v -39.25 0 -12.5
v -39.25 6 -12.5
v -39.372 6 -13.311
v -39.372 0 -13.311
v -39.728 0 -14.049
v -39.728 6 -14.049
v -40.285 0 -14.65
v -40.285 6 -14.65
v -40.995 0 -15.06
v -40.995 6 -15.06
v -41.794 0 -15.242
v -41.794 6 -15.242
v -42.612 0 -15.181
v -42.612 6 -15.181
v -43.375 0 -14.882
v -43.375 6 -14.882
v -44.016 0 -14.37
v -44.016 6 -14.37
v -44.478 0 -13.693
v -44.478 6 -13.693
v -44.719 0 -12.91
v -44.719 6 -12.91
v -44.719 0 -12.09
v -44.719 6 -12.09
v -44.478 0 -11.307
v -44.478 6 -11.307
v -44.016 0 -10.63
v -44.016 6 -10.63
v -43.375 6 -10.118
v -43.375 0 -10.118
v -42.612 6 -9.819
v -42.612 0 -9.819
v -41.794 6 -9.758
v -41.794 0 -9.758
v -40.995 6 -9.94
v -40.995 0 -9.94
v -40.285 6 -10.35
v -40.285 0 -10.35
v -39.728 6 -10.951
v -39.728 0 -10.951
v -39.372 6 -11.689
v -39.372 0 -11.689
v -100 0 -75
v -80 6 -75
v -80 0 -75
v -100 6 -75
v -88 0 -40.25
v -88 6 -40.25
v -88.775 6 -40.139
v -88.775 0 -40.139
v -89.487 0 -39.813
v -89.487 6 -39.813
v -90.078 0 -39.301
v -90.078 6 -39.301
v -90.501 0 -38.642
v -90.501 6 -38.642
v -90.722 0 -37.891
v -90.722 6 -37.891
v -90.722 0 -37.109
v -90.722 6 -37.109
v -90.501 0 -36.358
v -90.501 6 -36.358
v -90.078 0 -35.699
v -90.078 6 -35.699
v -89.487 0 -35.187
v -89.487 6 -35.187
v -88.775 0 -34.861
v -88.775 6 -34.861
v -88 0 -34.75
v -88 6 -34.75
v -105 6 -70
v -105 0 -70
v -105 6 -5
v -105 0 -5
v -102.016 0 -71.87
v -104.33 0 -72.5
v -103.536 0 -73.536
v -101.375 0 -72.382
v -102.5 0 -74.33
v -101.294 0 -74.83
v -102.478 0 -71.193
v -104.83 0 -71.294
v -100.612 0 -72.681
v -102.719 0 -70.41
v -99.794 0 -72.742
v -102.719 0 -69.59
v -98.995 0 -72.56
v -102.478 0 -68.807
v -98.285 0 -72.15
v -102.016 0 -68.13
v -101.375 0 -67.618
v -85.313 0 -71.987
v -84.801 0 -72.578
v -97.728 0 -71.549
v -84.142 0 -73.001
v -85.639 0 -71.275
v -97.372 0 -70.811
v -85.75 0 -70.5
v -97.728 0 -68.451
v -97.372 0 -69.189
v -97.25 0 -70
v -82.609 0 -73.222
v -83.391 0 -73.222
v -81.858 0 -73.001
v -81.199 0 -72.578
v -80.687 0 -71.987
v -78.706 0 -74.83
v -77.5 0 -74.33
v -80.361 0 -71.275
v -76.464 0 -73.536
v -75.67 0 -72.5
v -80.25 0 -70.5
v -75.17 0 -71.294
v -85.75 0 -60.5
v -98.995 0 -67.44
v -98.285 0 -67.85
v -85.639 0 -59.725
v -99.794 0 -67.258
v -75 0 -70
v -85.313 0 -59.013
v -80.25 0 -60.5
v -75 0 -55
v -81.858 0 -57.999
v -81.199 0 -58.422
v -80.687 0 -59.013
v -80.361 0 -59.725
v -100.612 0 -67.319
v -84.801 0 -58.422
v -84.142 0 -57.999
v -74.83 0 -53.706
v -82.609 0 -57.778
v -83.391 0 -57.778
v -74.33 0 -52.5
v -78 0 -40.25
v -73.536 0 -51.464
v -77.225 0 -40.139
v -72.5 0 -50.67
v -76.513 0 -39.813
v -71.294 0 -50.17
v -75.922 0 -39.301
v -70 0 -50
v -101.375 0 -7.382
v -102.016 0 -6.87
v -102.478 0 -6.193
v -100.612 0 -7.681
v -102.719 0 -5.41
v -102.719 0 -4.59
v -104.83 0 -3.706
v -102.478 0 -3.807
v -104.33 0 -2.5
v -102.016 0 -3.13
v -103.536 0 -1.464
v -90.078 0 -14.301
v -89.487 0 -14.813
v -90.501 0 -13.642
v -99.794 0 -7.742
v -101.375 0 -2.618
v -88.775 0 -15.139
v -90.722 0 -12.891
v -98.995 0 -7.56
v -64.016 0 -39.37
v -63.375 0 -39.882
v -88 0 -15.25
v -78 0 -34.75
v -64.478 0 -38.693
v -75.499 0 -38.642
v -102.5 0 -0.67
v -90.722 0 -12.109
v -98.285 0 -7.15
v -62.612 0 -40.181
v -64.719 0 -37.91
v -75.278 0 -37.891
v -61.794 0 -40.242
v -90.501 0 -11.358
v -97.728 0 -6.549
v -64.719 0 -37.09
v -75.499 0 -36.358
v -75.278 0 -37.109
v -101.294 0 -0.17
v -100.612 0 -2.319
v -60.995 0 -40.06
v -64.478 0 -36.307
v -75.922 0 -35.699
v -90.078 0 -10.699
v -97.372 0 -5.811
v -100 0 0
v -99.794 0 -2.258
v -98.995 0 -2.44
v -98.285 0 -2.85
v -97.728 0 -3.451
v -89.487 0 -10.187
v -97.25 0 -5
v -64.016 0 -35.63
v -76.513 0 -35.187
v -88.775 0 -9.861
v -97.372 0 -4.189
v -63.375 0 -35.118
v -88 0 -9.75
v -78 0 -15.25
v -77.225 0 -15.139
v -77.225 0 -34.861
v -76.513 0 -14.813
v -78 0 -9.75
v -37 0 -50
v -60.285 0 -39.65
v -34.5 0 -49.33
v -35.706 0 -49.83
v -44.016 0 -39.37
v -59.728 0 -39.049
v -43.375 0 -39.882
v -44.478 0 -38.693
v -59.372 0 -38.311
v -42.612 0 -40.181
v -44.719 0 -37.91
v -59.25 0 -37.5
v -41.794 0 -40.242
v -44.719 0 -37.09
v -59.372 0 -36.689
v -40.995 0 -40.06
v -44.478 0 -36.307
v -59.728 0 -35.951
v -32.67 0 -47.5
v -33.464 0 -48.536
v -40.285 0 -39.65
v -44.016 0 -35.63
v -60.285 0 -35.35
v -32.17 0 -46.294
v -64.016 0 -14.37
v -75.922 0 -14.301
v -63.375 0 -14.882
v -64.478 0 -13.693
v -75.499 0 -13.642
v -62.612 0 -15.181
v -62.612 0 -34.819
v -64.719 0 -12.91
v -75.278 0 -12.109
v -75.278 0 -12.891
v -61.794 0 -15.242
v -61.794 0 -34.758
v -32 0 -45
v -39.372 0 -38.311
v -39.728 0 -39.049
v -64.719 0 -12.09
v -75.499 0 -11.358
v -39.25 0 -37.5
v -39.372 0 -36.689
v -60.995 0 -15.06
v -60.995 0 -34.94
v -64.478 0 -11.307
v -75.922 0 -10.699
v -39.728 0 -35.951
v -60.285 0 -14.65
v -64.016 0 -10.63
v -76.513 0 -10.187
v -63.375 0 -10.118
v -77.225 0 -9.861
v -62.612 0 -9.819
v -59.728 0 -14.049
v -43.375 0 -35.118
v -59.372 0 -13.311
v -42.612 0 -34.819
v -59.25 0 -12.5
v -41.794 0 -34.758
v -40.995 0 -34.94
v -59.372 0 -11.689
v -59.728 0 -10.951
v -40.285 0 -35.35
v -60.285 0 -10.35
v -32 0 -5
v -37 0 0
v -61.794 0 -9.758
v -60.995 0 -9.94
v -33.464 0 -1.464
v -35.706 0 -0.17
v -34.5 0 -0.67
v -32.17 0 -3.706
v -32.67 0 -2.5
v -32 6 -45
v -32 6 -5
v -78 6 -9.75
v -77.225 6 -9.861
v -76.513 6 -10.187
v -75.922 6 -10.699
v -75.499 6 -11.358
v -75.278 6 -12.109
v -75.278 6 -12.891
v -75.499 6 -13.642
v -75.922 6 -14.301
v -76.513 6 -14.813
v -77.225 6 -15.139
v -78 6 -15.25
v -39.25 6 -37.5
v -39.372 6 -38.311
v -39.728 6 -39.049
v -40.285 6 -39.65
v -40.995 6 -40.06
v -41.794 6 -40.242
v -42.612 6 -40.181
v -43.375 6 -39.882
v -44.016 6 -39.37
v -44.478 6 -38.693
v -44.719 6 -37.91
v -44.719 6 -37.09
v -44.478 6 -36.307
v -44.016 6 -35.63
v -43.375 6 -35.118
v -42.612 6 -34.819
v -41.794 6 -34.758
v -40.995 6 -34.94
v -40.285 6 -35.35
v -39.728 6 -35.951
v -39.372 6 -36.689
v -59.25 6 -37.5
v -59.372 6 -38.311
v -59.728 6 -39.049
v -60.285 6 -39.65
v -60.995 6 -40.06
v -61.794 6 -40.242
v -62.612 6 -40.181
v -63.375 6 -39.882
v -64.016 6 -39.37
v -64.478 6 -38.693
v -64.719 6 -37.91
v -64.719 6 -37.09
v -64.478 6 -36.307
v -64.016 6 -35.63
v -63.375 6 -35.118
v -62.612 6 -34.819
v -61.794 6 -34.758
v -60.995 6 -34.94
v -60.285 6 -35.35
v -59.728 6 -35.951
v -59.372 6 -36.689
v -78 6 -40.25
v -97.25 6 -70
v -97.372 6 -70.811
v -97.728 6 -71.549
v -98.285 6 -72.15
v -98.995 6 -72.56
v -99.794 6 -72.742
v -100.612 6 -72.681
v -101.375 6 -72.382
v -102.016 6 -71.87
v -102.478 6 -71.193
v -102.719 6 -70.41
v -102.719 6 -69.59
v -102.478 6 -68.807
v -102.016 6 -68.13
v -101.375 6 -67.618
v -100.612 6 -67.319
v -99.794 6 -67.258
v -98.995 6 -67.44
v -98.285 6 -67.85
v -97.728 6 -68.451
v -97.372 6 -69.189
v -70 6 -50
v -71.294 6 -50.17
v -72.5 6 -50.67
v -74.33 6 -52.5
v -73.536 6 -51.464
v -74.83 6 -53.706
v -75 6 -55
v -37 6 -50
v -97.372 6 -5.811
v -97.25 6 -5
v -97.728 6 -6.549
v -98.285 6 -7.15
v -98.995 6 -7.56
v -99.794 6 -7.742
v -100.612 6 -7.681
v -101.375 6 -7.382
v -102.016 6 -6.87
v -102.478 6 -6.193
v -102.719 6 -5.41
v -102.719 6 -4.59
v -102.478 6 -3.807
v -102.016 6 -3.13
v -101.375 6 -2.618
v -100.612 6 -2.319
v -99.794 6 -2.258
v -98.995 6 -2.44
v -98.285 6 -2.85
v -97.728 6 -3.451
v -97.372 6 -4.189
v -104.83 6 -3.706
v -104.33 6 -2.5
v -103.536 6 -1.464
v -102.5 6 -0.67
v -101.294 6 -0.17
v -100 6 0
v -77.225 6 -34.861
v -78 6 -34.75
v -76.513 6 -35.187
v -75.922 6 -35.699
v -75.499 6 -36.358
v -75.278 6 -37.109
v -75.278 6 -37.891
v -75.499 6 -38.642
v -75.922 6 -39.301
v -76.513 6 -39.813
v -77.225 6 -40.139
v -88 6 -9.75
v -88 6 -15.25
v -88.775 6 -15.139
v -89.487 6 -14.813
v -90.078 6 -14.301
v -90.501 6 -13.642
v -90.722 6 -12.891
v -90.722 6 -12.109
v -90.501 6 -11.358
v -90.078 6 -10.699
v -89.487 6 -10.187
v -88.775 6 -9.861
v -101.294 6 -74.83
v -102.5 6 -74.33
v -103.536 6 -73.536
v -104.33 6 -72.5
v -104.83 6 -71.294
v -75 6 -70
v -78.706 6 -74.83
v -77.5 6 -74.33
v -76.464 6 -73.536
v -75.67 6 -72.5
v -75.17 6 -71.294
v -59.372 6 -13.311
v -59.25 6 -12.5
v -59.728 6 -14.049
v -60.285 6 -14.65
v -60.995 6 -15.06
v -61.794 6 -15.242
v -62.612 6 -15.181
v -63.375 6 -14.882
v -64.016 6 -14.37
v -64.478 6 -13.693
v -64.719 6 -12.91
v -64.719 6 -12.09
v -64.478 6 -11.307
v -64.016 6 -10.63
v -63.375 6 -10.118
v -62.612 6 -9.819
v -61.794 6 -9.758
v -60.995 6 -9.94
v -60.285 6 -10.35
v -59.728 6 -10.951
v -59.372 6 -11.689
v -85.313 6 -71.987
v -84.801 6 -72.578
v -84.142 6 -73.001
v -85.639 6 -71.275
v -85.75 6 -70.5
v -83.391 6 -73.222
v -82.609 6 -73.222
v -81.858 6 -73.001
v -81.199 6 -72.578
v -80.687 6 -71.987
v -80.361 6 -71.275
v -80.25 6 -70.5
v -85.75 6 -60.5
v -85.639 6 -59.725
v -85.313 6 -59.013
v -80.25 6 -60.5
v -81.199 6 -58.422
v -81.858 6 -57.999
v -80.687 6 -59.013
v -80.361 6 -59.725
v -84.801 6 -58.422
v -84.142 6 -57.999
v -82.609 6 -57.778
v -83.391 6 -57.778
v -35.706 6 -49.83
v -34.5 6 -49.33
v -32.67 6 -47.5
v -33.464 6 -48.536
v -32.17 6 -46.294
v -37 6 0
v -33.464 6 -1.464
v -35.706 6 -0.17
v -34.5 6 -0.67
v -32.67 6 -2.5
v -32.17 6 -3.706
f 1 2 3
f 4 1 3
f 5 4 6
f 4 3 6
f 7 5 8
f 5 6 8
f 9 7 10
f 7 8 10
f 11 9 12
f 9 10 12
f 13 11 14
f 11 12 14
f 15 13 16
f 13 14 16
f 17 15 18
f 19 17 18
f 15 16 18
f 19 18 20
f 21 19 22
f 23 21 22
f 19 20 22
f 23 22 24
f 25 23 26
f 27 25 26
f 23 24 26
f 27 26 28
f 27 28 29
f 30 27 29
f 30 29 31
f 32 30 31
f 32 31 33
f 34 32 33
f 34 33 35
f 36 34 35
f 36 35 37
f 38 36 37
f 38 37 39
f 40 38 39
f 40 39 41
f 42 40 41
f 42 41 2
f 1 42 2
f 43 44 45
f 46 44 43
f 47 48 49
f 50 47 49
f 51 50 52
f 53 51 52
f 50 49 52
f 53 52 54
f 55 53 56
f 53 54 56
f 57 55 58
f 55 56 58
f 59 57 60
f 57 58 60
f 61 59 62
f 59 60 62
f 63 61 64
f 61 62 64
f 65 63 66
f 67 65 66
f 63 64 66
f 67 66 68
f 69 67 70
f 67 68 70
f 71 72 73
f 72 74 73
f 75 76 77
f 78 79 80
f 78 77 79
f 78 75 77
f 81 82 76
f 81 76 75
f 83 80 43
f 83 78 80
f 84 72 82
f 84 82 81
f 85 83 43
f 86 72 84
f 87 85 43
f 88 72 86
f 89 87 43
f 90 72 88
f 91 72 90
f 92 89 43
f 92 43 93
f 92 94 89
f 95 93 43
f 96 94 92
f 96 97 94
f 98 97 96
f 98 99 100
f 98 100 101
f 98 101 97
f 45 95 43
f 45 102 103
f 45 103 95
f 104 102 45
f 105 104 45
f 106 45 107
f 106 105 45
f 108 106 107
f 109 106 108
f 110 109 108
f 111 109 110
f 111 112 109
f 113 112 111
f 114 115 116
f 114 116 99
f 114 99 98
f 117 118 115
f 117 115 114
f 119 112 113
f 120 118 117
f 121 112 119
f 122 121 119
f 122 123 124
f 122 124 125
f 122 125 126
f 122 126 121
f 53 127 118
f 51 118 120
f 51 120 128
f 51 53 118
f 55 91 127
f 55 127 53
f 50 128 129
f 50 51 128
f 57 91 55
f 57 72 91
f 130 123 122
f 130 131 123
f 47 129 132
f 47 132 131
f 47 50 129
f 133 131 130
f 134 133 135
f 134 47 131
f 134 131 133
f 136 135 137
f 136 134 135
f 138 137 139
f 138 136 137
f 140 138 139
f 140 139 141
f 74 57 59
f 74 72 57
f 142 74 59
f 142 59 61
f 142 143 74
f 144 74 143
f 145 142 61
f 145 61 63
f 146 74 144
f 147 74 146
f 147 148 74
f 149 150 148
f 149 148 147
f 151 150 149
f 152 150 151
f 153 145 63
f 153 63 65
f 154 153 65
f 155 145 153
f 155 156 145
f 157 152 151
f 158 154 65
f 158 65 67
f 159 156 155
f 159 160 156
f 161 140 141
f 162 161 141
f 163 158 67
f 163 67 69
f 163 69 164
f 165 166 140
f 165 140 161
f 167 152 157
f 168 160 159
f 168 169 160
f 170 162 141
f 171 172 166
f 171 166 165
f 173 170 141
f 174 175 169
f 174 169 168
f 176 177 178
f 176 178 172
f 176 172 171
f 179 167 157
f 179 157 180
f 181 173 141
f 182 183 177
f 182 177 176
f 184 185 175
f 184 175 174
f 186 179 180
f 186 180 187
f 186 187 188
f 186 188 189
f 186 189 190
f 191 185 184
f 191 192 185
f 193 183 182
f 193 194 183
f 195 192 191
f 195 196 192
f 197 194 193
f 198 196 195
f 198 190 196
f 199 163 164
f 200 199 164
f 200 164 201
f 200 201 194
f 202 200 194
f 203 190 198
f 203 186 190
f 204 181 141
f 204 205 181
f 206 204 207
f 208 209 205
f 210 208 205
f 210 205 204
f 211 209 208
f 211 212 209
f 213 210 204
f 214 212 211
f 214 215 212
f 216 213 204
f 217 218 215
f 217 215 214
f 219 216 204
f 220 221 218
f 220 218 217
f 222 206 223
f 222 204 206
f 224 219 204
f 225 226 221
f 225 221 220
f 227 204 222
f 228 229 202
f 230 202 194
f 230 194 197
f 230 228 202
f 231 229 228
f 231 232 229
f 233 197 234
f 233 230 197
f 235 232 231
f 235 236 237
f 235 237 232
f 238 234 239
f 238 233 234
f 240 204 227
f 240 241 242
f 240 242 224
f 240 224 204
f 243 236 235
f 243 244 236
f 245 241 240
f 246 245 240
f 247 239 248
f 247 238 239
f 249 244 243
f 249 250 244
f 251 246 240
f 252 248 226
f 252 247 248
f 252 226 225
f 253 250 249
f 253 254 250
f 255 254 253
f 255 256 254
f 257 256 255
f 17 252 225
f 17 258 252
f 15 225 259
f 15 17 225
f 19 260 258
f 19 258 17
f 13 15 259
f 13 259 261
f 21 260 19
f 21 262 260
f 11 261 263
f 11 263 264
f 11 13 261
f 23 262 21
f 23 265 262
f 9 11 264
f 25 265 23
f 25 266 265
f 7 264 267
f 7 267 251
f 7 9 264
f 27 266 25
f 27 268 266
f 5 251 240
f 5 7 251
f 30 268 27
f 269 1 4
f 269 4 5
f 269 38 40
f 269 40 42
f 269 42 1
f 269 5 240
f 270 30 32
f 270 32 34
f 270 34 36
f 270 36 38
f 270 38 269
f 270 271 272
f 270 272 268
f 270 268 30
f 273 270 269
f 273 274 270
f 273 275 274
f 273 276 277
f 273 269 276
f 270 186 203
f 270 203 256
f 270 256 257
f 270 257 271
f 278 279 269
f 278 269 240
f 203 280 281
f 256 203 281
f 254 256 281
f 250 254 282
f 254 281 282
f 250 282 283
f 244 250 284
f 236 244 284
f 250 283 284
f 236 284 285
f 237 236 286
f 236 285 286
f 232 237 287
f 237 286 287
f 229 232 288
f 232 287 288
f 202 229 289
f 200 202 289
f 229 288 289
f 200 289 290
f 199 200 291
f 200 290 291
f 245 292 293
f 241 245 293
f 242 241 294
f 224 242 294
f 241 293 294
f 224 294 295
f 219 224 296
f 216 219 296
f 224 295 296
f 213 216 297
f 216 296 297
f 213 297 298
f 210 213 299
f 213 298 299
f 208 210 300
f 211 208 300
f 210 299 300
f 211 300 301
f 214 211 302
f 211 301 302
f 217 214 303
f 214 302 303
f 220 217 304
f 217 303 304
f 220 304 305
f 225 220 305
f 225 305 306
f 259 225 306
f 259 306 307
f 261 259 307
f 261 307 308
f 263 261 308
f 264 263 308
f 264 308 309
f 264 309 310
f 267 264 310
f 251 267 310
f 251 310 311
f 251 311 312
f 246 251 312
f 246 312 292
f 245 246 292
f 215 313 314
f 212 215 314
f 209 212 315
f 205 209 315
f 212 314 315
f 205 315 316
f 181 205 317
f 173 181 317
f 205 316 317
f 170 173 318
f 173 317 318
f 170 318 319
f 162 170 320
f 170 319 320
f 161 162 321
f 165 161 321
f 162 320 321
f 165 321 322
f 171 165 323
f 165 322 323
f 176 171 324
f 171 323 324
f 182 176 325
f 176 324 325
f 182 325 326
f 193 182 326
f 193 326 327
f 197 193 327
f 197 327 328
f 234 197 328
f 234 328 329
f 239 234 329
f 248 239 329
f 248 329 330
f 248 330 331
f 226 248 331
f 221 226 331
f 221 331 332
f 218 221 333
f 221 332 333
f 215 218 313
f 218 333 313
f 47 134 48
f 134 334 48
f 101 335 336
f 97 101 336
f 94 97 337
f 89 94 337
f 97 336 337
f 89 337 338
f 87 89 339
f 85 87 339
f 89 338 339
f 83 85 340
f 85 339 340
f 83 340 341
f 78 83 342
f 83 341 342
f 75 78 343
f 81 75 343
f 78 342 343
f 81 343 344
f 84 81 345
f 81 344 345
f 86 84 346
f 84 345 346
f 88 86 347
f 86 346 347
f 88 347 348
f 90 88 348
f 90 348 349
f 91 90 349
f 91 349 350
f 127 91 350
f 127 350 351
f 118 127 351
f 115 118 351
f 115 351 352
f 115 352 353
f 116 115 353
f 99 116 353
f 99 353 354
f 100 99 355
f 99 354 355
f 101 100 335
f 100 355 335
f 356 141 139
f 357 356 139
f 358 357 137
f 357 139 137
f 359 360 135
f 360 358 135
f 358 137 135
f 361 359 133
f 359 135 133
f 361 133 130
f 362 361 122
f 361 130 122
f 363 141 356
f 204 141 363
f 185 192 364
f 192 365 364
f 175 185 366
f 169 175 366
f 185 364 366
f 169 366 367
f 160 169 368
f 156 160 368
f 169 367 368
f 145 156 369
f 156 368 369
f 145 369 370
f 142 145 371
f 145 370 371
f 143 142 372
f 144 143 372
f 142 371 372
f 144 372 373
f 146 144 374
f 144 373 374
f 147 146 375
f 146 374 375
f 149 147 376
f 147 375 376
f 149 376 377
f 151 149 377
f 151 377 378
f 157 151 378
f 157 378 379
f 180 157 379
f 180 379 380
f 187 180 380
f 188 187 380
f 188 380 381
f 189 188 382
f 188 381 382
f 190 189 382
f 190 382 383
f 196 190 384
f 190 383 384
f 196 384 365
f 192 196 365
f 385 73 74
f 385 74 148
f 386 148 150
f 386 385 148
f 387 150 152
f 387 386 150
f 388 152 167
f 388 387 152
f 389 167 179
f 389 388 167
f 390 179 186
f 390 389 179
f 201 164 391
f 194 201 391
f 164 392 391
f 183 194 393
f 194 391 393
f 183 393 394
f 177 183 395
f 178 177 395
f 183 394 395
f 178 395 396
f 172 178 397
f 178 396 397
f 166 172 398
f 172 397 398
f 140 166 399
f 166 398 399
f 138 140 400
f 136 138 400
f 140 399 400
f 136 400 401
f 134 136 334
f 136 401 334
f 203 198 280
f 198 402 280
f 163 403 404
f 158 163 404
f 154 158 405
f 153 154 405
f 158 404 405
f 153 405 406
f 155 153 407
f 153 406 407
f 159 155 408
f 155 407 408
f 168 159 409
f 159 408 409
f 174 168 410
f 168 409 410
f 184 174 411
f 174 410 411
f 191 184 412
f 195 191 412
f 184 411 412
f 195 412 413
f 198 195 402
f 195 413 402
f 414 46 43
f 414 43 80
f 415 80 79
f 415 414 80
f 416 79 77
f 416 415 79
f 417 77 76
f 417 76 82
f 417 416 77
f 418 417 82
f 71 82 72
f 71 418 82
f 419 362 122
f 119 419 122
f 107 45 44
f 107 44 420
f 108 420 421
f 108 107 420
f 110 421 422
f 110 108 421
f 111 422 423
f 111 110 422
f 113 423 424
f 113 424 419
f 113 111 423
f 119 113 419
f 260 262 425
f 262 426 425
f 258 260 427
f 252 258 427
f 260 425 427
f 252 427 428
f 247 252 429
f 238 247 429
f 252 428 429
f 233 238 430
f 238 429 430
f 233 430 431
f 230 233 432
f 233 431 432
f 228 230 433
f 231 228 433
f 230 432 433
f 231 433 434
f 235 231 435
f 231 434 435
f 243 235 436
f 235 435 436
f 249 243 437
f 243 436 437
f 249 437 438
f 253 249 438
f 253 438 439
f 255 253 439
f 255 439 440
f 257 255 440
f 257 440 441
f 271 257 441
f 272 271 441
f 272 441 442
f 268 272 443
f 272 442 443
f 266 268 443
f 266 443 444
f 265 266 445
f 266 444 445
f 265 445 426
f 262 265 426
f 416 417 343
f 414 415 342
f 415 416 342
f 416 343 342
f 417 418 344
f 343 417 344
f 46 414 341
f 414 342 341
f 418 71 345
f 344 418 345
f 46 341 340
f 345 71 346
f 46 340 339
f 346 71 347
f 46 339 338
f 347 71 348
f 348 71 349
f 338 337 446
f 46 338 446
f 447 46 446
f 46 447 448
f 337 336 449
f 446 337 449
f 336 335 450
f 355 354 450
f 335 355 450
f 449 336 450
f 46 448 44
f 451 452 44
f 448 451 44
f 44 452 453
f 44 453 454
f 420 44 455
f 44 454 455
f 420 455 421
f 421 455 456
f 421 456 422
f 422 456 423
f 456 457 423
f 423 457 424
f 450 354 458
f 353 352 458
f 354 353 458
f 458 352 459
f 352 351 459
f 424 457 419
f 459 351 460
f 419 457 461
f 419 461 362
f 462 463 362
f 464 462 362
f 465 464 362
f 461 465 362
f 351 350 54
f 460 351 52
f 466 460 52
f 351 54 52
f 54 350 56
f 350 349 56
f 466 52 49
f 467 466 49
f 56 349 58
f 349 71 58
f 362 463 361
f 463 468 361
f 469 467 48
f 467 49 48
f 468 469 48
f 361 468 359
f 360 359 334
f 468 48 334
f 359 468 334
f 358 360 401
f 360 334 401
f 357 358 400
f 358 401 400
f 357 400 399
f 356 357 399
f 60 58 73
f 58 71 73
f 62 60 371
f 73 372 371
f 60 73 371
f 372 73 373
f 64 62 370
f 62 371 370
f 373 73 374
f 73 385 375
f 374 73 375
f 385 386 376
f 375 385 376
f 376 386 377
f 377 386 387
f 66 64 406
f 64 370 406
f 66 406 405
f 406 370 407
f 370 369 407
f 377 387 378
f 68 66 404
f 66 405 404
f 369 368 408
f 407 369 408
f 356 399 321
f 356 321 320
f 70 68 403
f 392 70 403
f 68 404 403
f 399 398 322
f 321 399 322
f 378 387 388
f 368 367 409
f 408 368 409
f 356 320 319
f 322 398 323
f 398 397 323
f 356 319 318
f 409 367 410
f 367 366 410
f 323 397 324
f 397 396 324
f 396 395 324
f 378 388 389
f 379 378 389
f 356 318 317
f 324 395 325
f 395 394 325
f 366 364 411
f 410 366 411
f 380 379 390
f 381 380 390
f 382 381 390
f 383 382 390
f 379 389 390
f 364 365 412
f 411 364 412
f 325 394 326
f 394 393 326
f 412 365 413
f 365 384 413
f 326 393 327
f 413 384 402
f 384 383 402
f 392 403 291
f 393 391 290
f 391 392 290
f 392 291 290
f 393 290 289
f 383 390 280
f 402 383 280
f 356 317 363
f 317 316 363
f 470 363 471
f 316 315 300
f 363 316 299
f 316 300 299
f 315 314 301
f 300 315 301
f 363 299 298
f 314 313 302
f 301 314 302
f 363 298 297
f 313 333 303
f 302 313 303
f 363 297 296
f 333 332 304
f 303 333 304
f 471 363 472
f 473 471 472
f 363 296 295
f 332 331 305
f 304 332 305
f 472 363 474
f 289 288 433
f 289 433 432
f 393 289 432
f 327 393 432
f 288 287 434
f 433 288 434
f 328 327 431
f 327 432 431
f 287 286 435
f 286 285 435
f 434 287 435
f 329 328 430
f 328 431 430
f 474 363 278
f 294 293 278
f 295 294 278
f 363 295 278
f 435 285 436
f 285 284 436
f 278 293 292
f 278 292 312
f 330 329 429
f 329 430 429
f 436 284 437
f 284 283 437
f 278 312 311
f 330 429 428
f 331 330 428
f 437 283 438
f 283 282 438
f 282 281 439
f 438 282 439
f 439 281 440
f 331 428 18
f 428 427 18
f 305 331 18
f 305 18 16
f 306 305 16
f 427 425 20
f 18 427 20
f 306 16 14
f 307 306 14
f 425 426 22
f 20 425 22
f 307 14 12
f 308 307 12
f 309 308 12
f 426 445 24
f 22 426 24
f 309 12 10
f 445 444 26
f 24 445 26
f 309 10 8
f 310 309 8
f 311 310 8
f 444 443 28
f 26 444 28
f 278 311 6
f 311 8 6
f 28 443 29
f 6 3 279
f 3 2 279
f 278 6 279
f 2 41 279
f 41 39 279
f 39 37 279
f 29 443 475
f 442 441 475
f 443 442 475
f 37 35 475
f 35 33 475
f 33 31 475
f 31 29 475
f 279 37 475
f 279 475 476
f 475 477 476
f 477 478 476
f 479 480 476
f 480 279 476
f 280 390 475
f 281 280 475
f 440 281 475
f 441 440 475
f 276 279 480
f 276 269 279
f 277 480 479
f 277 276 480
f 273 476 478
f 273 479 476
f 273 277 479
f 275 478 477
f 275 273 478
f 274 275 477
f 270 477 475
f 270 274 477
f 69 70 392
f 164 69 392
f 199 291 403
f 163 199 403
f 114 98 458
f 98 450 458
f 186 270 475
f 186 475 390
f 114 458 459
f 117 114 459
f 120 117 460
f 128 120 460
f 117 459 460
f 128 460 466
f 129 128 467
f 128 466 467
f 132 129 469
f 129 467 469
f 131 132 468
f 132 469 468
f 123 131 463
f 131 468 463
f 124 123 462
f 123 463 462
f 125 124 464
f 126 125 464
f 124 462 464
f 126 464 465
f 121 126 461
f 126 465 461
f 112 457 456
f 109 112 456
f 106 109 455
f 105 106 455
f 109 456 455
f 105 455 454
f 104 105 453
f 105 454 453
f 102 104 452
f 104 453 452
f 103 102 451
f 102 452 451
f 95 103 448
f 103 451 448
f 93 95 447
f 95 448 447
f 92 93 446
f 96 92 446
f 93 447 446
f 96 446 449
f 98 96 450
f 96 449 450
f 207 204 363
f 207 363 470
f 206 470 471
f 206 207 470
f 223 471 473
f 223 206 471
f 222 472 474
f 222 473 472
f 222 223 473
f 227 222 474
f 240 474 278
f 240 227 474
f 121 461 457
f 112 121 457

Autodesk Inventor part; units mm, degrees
ref_plane "YZ Plane" through (0, 0, 0) normal (1, 0, 0) x (0, 1, 0)
ref_plane "XZ Plane" through (0, 0, 0) normal (0, 1, 0) x (-1, 0, 0)
ref_plane "XY Plane" through (0, 0, 0) normal (0, 0, 1) x (1, 0, 0)
sketch "Sketch1" plane through (0, 0, 0) normal (0, 1, 0) x (-1, 0, 0)
  line L0 (0, 0) -> (105, 0)
  line L1 (105, 0) -> (105, -50)
  line L2 (105, -50) -> (0, -50)
  line L3 (0, -50) -> (0, 0)
  line L4 (0, 0) -> (0, -16.6667)
  line L5 (0, -16.6667) -> (11, -16.6667)
  dimension "d0" = 105
  dimension "d1" = 50
  dimension "d2" = 16.6667
  dimension "d3" = 11
extrude "Extrusion1" add sketch "Sketch1" along normal blind 6
sketch "Sketch3" plane through (0, 6, 0) normal (0, 1, 0) x (1, 0, 0)
  circle A0 centre (-20, 12.5) radius 2.75
  line L0 (0, 0) -> (0, 50) projected
  line L1 (-105, 0) -> (0, 0) projected
  circle A1 centre (-20, 37.5) radius 2.75
  dimension "d21" = 5.5
  dimension "d22" = 20
  dimension "d23" = 12.5
  dimension "d26" = 25
extrude "Extrusion3" cut sketch "Sketch3" against normal through all
sketch "Sketch4" plane through (0, 6, 0) normal (0, 1, 0) x (1, 0, 0)
  circle A0 centre (-20, 12.5) radius 2.75 projected
  line L0 (-20, 12.5) -> (-78, 12.5)
  line L1 (-78, 12.5) -> (-88, 12.5) construction
  line L2 (-78, 15.25) -> (-88, 15.25)
  line L3 (-88, 9.75) -> (-78, 9.75)
  arc A1 (-78, 9.75) -> (-78, 15.25) centre (-78, 12.5) ccw
  arc A2 (-88, 15.25) -> (-88, 9.75) centre (-88, 12.5) ccw
  point P0 (0, 0)
  point P1 (-83, 12.5)
  dimension "d33" = 58
  dimension "d34" = 10
  dimension "d35" = 5.5
extrude "Extrusion4" cut sketch "Sketch4" against normal through all contours A1 L3 A2 L2
pattern_linear "Rectangular Pattern2" count 2 spacing 25 along (0, 0, -1) of "Extrusion4"
sketch "Sketch5" plane through (0, 0, -50) normal (0, 0, -1) x (-1, 0, 0)
  line L0 (105, 0) -> (105, 6) projected
  line L1 (105, 0) -> (0, 0) projected
  line L2 (105, 6) -> (75, 6)
  line L3 (75, 6) -> (75, 0)
  line L4 (75, 0) -> (105, 0)
  line L5 (105, 0) -> (105, 6)
  dimension "d45" = 30
extrude "Extrusion5" add sketch "Sketch5" along normal blind 25
sketch "Sketch6" plane through (0, 6, 0) normal (0, 1, 0) x (1, 0, 0)
  line L0 (-83, 60.5) -> (-83, 70.5) construction
  line L1 (-80.25, 60.5) -> (-80.25, 70.5)
  line L2 (-85.75, 70.5) -> (-85.75, 60.5)
  arc A0 (-85.75, 60.5) -> (-80.25, 60.5) centre (-83, 60.5) ccw
  arc A1 (-80.25, 70.5) -> (-85.75, 70.5) centre (-83, 70.5) ccw
  line L3 (-75, 50) -> (-75, 75) projected
  arc A2 (-88, 40.25) -> (-88, 34.75) centre (-88, 37.5) ccw projected
  point P0 (0, 0)
  point P1 (-83, 65.5)
  dimension "d48" = 10
  dimension "d49" = 5.5
  dimension "d50" = 8
  dimension "d51" = 28
extrude "Extrusion6" cut sketch "Sketch6" against normal through all
fillet "Fillet2" radius 5 6 edges at (-105, 3, 0) (0, 3, 0) (-75, 3, -75) (-105, 3, -75) (0, 3, -50) (-75, 3, -50)
sketch "Sketch7" plane through (0, 6, 0) normal (0, 1, 0) x (1, 0, 0)
  circle A0 centre (-20, 12.5) radius 2.75 projected
  line L0 (-20, 12.5) -> (-42, 12.5)
  line L1 (-42, 12.5) -> (-62, 12.5)
  circle A1 centre (-62, 12.5) radius 2.75
  circle A2 centre (-42, 12.5) radius 2.75
  line L2 (0, 5) -> (0, 45) projected
  line L3 (0, 0) -> (0, 45)
  circle A3 centre (-42, 37.5) radius 2.75
  circle A4 centre (-62, 37.5) radius 2.75
  dimension "d55" = 22
  dimension "d56" = 20
  dimension "d57" = 5.5
  dimension "d58" = 5.5
  dimension "d61" = 25
extrude "Extrusion7" cut sketch "Sketch7" against normal through all contours A2 L1 L0 | L0 L1 A2 | A1 | A3 | A4
sketch "Sketch9" plane through (0, 6, 0) normal (0, 1, 0) x (1, 0, 0)
  point P0 (0, 0)
sketch "Sketch10" plane through (0, 6, 0) normal (0, 1, 0) x (1, 0, 0)
  circle A0 centre (-100, 70) radius 2.75
  line L0 (-100, 75) -> (-80, 75) projected
  line L1 (-105, 5) -> (-105, 70) projected
  circle A1 centre (-100, 5) radius 2.75
  line L2 (-100, 0) -> (-5, 0) projected
  circle A2 centre (-5, 45) radius 2.75
  line L3 (-5, 50) -> (-70, 50) projected
  line L4 (0, 5) -> (0, 45) projected
  circle A3 centre (-5, 5) radius 2.75
  point P0 (0, 0)
  dimension "d70" = 5.5
  dimension "d71" = 5
  dimension "d72" = 5
  dimension "d73" = 5.5
  dimension "d74" = 5
  dimension "d75" = 5
  dimension "d76" = 5.5
  dimension "d77" = 5
  dimension "d78" = 5
  dimension "d79" = 5.5
  dimension "d80" = 5
  dimension "d81" = 5
extrude "Extrusion9" cut sketch "Sketch10" against normal through all
sketch "Sketch12" plane through (0, 6, 0) normal (0, 1, 0) x (1, 0, 0)
  circle A0 centre (-42, 37.5) radius 2.75 projected
  line L0 (-42, 37.5) -> (-32, 37.5)
  line L1 (-32, 37.5) -> (-32, 50)
  line L2 (-5, 50) -> (-70, 50) projected
  line L3 (-32, 50) -> (0, 50)
  line L4 (0, 50) -> (0, 0)
  line L5 (0, 0) -> (-32, 0)
  line L6 (-32, 0) -> (-32, 50)
  dimension "d87" = 10
extrude "Extrusion10" cut sketch "Sketch12" against normal blind 10 contours L1 L2 L3 L4 L5 L6
fillet "Fillet3" radius 5 2 edges at (-32, 3, 0) (-32, 3, -50)
properties part number "X_Carriage_Plate_Short"
